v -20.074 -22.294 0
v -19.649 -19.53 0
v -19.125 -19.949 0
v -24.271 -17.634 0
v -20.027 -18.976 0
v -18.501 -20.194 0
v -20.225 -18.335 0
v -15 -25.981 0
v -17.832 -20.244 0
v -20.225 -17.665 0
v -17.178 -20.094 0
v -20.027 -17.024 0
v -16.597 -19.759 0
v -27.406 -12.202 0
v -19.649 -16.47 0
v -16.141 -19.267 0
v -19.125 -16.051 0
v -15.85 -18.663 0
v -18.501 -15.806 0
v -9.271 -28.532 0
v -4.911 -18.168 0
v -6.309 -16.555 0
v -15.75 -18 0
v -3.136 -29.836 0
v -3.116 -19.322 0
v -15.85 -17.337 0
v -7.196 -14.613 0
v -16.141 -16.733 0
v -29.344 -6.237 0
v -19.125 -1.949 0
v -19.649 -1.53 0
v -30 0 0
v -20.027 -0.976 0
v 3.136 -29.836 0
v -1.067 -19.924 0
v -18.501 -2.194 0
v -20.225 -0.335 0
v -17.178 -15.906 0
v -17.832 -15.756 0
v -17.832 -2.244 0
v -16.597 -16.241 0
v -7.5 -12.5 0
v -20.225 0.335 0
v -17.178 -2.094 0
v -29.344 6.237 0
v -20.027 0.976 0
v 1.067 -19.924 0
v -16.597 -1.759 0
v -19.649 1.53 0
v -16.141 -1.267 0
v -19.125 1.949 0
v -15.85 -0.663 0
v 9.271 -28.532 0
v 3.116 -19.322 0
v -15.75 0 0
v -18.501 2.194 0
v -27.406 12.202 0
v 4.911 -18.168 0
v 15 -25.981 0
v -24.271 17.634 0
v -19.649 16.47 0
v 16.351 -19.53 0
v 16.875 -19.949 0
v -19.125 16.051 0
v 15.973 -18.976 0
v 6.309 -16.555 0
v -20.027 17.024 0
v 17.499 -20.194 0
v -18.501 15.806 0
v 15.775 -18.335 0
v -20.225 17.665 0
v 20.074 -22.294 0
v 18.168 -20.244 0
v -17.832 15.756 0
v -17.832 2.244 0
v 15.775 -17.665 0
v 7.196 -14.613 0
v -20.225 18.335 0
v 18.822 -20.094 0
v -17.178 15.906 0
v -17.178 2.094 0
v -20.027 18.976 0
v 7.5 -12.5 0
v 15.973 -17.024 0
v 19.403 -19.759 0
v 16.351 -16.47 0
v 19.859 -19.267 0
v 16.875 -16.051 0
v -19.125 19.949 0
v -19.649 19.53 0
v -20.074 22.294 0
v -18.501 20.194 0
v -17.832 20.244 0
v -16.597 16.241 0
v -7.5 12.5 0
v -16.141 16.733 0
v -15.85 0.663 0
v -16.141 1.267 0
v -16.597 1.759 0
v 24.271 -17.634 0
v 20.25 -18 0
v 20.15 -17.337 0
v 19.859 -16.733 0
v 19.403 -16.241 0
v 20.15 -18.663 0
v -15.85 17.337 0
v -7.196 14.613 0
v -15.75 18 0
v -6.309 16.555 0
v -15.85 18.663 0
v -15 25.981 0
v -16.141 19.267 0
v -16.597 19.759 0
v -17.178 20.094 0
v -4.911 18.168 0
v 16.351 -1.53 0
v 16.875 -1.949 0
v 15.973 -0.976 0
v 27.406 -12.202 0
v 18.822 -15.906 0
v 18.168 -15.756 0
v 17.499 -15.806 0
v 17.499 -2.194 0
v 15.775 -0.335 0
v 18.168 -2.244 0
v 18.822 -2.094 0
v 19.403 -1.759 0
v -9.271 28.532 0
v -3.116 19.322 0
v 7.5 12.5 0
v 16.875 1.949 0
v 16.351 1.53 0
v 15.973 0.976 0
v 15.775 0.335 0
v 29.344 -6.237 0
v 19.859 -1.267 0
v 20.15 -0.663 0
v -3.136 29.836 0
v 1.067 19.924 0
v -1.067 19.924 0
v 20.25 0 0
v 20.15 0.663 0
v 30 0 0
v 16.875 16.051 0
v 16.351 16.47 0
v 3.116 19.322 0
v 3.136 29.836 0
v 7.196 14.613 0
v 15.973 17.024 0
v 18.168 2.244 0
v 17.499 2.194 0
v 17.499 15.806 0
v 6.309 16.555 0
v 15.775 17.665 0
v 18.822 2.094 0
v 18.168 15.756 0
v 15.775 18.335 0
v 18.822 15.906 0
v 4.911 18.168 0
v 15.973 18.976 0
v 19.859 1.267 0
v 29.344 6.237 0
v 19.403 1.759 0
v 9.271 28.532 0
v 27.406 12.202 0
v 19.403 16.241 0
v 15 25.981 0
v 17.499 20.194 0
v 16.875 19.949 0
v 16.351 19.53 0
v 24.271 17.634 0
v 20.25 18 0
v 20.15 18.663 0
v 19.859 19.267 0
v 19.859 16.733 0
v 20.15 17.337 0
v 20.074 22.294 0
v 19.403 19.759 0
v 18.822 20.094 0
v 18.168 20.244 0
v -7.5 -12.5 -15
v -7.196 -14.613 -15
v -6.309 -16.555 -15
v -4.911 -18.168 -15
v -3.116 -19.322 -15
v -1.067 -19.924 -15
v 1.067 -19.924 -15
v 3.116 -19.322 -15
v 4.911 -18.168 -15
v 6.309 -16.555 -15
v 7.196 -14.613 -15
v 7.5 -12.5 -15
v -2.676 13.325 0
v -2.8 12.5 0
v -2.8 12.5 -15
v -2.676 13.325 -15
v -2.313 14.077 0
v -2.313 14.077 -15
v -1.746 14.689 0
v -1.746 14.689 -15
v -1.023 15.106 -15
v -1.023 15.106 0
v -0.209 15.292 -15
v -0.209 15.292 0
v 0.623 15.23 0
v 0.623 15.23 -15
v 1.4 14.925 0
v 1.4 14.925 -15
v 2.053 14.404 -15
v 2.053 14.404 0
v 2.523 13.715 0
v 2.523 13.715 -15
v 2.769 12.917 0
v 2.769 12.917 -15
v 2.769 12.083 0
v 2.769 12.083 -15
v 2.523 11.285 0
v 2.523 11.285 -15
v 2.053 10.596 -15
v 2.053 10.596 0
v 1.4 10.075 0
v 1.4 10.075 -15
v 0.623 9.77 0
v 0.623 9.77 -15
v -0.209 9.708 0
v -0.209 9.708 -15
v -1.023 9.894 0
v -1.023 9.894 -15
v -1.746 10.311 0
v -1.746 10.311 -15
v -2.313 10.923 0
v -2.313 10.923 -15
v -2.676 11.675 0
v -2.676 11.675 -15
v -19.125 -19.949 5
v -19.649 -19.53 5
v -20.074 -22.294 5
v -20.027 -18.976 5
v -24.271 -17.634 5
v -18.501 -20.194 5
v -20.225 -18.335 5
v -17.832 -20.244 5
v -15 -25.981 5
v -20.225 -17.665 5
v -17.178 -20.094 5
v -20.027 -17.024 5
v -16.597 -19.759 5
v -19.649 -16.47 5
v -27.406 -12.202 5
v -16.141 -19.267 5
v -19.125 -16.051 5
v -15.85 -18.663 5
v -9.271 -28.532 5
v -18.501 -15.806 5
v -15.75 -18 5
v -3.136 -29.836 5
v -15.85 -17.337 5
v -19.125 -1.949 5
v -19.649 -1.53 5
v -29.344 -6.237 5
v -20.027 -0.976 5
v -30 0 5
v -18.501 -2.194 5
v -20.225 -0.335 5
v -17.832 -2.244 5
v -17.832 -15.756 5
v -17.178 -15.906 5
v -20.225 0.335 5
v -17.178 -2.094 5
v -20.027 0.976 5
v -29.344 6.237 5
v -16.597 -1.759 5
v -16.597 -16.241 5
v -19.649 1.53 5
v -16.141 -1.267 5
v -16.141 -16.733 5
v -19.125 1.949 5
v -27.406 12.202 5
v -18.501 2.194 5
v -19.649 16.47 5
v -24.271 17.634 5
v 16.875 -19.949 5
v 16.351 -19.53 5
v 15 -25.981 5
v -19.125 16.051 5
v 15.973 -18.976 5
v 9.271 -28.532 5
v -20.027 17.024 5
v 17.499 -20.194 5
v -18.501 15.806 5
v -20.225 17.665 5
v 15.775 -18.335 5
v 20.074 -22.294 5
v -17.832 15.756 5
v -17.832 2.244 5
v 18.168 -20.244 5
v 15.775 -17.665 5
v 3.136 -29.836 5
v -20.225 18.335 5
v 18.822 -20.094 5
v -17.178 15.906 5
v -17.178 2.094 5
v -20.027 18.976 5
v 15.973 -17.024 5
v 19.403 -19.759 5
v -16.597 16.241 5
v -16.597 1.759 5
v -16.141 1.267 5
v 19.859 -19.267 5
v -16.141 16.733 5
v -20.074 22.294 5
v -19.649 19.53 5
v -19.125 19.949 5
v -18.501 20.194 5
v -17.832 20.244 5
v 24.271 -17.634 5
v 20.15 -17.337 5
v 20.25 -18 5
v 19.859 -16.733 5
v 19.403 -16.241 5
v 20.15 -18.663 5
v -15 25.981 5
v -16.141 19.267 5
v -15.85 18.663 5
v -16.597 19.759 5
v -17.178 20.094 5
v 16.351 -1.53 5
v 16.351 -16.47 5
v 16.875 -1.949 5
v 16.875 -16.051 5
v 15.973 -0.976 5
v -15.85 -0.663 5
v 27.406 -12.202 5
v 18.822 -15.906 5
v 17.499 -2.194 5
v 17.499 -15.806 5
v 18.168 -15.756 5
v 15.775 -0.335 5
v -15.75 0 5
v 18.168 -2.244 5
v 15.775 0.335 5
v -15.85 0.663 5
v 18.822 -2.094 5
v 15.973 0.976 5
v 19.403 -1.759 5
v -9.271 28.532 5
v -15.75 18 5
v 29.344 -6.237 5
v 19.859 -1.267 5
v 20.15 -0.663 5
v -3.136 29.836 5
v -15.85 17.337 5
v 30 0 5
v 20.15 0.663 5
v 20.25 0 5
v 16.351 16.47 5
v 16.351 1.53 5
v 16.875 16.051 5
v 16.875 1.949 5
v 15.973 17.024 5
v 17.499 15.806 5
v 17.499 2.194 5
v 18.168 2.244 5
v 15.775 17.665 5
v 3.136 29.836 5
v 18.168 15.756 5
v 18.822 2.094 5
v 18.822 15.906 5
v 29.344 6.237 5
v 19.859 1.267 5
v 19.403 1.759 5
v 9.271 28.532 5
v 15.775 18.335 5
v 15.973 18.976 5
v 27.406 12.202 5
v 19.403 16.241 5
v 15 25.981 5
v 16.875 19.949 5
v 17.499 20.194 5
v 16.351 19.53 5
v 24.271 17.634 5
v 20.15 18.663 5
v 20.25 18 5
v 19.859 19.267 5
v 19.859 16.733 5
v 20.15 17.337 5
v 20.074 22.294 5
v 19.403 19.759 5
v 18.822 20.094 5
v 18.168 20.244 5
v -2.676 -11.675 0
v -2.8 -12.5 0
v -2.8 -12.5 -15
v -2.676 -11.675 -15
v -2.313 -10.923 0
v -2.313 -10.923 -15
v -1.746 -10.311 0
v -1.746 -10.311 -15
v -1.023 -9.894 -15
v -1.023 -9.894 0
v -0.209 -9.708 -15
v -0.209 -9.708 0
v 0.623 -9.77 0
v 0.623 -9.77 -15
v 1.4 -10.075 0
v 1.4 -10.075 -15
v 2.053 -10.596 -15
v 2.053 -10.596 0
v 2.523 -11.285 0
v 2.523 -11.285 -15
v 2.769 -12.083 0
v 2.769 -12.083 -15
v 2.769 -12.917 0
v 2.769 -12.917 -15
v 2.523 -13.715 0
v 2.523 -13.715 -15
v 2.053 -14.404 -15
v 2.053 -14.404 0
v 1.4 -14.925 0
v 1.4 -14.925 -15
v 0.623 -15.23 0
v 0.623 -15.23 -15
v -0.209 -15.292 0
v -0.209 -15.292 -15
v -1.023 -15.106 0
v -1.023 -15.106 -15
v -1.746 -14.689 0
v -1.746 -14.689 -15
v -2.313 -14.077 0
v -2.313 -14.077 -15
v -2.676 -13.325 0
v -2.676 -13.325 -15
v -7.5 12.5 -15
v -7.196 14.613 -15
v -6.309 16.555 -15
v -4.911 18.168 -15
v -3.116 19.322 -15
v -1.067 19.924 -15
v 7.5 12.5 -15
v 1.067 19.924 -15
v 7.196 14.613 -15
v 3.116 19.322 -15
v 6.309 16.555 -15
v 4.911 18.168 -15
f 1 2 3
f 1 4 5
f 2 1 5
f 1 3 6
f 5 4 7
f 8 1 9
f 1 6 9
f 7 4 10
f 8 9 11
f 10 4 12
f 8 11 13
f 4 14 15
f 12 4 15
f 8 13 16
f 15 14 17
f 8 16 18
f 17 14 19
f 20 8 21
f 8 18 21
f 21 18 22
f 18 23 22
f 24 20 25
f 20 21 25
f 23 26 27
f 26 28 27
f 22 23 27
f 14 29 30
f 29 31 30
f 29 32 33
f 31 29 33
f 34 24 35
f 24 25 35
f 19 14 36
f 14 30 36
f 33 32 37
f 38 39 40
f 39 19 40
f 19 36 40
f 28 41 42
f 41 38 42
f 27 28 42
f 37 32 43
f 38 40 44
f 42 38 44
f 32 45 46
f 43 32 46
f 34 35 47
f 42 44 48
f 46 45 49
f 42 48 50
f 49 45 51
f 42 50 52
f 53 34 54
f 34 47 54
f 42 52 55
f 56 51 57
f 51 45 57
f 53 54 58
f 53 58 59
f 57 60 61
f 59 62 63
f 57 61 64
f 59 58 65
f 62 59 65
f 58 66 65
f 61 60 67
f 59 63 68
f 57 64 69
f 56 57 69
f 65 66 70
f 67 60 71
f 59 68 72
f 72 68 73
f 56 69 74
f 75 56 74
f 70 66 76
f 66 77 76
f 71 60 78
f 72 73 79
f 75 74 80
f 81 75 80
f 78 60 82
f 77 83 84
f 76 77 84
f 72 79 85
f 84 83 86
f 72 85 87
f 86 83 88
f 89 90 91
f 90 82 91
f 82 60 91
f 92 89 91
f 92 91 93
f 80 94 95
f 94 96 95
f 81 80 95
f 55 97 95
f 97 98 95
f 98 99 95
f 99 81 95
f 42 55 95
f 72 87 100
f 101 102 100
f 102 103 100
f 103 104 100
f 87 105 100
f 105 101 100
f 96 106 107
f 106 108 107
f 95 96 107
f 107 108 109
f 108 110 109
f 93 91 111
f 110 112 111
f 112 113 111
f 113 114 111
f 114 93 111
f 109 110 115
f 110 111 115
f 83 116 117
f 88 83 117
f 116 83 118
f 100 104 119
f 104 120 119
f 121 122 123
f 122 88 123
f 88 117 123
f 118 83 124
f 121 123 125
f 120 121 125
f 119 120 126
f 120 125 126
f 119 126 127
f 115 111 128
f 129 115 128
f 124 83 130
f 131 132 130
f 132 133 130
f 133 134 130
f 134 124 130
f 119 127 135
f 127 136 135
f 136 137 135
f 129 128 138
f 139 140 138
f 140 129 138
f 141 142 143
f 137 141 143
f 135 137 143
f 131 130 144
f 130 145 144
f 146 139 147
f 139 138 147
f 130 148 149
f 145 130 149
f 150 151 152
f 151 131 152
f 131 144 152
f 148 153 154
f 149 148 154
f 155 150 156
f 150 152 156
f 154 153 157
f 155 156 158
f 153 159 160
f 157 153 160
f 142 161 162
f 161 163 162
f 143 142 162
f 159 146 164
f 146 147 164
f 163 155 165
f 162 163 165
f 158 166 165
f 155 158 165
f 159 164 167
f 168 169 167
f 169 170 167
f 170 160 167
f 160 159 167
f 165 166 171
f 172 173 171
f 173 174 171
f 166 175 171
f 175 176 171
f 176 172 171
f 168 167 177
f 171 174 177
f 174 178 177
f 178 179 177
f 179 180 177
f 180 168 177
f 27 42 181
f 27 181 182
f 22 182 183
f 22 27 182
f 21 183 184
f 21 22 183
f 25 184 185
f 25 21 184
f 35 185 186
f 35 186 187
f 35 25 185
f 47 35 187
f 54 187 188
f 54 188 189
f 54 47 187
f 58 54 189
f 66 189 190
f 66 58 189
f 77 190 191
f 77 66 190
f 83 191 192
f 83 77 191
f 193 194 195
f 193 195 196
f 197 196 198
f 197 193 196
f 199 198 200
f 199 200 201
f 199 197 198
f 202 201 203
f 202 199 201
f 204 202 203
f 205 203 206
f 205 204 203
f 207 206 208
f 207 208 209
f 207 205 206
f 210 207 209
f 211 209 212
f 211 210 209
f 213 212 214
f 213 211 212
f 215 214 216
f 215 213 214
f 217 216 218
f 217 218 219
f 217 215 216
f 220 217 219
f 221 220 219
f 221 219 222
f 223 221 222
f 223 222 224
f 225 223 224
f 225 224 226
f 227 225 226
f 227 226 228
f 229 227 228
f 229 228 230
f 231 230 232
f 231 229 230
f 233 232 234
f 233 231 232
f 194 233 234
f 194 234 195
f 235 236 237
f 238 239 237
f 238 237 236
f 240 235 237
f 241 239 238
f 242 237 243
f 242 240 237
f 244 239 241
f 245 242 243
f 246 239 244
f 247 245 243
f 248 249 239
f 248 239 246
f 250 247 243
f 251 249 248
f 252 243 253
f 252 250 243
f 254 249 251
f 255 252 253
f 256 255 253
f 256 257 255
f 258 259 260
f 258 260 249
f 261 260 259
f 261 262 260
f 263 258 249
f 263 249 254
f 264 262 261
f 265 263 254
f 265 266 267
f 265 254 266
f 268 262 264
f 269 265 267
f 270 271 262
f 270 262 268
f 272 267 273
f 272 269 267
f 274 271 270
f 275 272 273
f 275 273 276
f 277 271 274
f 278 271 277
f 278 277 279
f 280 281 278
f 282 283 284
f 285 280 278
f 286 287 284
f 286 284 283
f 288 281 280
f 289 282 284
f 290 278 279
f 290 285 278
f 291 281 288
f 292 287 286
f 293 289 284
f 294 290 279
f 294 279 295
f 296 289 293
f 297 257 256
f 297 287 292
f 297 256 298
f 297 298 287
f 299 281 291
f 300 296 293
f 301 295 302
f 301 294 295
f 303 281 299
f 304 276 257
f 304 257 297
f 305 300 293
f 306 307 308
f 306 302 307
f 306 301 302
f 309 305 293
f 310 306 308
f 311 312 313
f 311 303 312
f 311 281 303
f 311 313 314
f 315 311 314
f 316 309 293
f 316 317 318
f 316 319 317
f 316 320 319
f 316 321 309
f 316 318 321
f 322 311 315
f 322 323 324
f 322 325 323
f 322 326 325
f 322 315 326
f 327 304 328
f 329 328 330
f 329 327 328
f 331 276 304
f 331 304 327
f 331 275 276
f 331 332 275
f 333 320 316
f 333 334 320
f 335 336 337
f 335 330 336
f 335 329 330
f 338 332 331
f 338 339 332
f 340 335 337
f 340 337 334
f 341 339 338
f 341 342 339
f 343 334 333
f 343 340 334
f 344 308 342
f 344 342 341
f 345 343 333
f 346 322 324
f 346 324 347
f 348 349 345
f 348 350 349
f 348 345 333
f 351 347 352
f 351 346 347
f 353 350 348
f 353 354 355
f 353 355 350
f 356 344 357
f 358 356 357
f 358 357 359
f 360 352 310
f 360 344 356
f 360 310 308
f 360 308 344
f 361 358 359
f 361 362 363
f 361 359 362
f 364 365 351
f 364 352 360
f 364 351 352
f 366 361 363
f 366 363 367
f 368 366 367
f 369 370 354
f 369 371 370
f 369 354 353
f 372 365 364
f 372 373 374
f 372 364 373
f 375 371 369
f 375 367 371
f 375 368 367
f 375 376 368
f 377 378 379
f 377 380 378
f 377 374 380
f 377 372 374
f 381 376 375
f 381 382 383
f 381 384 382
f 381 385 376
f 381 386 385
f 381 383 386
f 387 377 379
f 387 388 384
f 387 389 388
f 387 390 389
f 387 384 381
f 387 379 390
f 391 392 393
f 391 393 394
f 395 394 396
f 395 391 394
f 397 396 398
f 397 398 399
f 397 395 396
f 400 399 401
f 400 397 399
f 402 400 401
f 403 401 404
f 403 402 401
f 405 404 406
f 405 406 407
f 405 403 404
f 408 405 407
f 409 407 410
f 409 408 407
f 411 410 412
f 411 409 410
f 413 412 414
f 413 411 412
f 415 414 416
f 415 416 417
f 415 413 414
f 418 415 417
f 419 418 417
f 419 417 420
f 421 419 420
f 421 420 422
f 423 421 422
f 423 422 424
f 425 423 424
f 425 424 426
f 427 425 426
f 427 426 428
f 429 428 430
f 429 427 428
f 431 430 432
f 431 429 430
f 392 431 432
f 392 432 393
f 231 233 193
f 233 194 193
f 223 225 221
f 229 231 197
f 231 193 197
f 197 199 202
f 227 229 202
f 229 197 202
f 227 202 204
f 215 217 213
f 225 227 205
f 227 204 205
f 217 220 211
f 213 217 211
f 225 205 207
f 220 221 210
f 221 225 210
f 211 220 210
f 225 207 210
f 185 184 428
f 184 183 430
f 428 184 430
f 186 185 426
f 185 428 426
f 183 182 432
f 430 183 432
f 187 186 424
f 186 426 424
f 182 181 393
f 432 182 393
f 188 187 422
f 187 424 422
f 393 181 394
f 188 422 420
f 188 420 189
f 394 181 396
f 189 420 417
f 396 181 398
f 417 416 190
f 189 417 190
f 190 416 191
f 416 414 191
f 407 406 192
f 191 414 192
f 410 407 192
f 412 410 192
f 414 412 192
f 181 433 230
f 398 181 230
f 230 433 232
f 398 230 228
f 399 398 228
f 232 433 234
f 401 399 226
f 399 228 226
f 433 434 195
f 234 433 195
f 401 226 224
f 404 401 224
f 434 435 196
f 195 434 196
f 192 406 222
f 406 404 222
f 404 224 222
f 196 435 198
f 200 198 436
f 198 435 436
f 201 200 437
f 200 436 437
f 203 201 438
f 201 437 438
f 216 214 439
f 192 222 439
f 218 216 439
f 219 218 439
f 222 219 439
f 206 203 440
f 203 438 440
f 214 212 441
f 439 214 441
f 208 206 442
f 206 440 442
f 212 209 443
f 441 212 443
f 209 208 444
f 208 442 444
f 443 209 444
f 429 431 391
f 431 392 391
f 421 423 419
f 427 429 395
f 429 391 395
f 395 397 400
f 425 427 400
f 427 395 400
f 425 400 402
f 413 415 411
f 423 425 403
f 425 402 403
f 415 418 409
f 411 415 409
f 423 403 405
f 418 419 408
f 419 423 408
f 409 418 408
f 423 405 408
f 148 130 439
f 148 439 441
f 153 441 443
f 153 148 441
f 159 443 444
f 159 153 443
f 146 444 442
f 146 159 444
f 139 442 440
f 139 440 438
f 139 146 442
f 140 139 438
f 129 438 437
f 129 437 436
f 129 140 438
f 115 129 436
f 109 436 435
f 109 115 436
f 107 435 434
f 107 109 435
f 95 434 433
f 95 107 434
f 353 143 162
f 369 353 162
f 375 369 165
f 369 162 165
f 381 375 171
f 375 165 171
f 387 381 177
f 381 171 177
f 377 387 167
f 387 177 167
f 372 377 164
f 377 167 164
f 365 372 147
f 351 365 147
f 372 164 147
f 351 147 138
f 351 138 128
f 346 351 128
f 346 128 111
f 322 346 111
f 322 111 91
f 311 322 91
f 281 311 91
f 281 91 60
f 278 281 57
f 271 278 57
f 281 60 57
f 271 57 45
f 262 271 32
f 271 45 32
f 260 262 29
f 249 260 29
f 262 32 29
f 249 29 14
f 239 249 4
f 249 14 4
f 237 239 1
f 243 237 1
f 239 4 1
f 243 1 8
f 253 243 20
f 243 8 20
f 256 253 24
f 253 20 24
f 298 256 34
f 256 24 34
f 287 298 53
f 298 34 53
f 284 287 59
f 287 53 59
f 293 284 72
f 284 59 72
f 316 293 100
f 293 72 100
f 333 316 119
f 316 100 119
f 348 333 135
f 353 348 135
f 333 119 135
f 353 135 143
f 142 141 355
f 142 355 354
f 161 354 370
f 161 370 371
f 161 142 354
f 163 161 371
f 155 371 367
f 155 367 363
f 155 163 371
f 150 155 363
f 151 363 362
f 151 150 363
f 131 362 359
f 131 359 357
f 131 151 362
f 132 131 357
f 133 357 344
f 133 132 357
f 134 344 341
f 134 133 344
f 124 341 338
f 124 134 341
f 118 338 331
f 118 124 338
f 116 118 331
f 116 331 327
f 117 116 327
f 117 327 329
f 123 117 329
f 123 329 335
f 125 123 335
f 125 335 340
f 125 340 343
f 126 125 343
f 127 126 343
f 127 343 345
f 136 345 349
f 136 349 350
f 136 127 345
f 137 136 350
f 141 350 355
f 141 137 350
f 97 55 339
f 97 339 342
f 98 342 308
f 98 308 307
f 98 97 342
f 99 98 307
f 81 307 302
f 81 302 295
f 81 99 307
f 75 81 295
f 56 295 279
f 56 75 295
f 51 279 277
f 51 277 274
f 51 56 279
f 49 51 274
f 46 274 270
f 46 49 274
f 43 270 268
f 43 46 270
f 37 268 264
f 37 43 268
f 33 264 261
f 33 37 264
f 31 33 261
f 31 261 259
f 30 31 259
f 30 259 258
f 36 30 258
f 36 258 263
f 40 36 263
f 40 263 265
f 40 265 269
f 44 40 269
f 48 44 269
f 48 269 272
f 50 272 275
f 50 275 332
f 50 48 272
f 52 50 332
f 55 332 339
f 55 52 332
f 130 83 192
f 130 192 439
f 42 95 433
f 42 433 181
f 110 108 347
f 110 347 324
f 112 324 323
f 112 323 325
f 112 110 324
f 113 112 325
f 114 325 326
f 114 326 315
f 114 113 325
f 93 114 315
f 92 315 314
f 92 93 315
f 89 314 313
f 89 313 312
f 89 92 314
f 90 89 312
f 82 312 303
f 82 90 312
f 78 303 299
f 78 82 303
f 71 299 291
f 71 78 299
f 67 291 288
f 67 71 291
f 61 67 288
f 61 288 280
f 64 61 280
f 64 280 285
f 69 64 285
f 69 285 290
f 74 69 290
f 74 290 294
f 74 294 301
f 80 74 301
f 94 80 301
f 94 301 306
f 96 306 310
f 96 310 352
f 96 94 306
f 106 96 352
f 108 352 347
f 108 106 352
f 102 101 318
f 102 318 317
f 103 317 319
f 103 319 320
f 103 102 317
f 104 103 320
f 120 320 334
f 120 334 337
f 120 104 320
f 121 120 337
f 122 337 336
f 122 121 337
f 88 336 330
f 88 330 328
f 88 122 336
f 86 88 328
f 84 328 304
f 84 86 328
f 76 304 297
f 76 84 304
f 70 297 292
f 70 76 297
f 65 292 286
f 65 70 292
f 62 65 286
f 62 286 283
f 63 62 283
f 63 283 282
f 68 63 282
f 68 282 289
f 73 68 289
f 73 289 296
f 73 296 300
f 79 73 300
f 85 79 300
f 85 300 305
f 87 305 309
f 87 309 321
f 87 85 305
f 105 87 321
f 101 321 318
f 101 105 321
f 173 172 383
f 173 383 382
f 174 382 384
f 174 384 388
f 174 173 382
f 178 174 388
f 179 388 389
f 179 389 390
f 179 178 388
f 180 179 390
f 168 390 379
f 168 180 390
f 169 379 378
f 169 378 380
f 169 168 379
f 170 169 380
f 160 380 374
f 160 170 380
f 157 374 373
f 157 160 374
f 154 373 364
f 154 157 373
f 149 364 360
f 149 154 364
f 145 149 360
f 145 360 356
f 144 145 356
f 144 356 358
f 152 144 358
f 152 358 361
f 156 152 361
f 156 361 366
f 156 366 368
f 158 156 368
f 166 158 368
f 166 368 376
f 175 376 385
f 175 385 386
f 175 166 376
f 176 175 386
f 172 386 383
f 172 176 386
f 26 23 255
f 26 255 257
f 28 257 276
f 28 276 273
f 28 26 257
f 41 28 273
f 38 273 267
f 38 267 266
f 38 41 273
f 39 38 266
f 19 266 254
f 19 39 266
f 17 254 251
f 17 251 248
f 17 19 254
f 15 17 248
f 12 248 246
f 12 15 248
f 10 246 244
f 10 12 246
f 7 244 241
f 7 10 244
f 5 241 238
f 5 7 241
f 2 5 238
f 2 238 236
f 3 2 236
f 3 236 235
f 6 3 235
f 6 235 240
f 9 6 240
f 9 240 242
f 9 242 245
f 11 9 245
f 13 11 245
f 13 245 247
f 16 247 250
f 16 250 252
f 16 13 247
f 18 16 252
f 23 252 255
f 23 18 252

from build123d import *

# Parameters (mm, degrees)
ESQUISSE1_R        = 30
ESQUISSE1_R_2      = 2.25
BOSS_EXTRU_1_DEPTH = 5
ESQUISSE2_R        = 2.8
BOSS_EXTRU_2_DEPTH = 15


with BuildPart() as part:
    # Esquisse1 → Boss.-Extru.1 (new body)
    with BuildSketch(Plane.XY):
        Circle(ESQUISSE1_R)
        with Locations((18, 18)):
            Circle(ESQUISSE1_R_2, mode=Mode.SUBTRACT)
        with Locations((-18, 18)):
            Circle(ESQUISSE1_R_2, mode=Mode.SUBTRACT)
        with Locations((-18, -18)):
            Circle(ESQUISSE1_R_2, mode=Mode.SUBTRACT)
        with Locations((18, -18)):
            Circle(ESQUISSE1_R_2, mode=Mode.SUBTRACT)
        with Locations((18, 0)):
            Circle(ESQUISSE1_R_2, mode=Mode.SUBTRACT)
        with Locations((-18, 0)):
            Circle(ESQUISSE1_R_2, mode=Mode.SUBTRACT)
    extrude(amount=BOSS_EXTRU_1_DEPTH)

    # Esquisse2 → Boss.-Extru.2 (add)
    with BuildSketch(Plane(origin=(0, 0, 0), x_dir=(-1, 0, 0), z_dir=(0, 0, -1))):
        with BuildLine():
            Line((7.5, 12.5), (7.5, -12.5))
            ThreePointArc((7.5, -12.5), (0, -20), (-7.5, -12.5))
            Line((-7.5, -12.5), (-7.5, 12.5))
            ThreePointArc((-7.5, 12.5), (0, 20), (7.5, 12.5))
        make_face()
        with Locations((0, 12.5)):
            Circle(ESQUISSE2_R, mode=Mode.SUBTRACT)
        with Locations((0, -12.5)):
            Circle(ESQUISSE2_R, mode=Mode.SUBTRACT)
    extrude(amount=BOSS_EXTRU_2_DEPTH)


solid = part.part
